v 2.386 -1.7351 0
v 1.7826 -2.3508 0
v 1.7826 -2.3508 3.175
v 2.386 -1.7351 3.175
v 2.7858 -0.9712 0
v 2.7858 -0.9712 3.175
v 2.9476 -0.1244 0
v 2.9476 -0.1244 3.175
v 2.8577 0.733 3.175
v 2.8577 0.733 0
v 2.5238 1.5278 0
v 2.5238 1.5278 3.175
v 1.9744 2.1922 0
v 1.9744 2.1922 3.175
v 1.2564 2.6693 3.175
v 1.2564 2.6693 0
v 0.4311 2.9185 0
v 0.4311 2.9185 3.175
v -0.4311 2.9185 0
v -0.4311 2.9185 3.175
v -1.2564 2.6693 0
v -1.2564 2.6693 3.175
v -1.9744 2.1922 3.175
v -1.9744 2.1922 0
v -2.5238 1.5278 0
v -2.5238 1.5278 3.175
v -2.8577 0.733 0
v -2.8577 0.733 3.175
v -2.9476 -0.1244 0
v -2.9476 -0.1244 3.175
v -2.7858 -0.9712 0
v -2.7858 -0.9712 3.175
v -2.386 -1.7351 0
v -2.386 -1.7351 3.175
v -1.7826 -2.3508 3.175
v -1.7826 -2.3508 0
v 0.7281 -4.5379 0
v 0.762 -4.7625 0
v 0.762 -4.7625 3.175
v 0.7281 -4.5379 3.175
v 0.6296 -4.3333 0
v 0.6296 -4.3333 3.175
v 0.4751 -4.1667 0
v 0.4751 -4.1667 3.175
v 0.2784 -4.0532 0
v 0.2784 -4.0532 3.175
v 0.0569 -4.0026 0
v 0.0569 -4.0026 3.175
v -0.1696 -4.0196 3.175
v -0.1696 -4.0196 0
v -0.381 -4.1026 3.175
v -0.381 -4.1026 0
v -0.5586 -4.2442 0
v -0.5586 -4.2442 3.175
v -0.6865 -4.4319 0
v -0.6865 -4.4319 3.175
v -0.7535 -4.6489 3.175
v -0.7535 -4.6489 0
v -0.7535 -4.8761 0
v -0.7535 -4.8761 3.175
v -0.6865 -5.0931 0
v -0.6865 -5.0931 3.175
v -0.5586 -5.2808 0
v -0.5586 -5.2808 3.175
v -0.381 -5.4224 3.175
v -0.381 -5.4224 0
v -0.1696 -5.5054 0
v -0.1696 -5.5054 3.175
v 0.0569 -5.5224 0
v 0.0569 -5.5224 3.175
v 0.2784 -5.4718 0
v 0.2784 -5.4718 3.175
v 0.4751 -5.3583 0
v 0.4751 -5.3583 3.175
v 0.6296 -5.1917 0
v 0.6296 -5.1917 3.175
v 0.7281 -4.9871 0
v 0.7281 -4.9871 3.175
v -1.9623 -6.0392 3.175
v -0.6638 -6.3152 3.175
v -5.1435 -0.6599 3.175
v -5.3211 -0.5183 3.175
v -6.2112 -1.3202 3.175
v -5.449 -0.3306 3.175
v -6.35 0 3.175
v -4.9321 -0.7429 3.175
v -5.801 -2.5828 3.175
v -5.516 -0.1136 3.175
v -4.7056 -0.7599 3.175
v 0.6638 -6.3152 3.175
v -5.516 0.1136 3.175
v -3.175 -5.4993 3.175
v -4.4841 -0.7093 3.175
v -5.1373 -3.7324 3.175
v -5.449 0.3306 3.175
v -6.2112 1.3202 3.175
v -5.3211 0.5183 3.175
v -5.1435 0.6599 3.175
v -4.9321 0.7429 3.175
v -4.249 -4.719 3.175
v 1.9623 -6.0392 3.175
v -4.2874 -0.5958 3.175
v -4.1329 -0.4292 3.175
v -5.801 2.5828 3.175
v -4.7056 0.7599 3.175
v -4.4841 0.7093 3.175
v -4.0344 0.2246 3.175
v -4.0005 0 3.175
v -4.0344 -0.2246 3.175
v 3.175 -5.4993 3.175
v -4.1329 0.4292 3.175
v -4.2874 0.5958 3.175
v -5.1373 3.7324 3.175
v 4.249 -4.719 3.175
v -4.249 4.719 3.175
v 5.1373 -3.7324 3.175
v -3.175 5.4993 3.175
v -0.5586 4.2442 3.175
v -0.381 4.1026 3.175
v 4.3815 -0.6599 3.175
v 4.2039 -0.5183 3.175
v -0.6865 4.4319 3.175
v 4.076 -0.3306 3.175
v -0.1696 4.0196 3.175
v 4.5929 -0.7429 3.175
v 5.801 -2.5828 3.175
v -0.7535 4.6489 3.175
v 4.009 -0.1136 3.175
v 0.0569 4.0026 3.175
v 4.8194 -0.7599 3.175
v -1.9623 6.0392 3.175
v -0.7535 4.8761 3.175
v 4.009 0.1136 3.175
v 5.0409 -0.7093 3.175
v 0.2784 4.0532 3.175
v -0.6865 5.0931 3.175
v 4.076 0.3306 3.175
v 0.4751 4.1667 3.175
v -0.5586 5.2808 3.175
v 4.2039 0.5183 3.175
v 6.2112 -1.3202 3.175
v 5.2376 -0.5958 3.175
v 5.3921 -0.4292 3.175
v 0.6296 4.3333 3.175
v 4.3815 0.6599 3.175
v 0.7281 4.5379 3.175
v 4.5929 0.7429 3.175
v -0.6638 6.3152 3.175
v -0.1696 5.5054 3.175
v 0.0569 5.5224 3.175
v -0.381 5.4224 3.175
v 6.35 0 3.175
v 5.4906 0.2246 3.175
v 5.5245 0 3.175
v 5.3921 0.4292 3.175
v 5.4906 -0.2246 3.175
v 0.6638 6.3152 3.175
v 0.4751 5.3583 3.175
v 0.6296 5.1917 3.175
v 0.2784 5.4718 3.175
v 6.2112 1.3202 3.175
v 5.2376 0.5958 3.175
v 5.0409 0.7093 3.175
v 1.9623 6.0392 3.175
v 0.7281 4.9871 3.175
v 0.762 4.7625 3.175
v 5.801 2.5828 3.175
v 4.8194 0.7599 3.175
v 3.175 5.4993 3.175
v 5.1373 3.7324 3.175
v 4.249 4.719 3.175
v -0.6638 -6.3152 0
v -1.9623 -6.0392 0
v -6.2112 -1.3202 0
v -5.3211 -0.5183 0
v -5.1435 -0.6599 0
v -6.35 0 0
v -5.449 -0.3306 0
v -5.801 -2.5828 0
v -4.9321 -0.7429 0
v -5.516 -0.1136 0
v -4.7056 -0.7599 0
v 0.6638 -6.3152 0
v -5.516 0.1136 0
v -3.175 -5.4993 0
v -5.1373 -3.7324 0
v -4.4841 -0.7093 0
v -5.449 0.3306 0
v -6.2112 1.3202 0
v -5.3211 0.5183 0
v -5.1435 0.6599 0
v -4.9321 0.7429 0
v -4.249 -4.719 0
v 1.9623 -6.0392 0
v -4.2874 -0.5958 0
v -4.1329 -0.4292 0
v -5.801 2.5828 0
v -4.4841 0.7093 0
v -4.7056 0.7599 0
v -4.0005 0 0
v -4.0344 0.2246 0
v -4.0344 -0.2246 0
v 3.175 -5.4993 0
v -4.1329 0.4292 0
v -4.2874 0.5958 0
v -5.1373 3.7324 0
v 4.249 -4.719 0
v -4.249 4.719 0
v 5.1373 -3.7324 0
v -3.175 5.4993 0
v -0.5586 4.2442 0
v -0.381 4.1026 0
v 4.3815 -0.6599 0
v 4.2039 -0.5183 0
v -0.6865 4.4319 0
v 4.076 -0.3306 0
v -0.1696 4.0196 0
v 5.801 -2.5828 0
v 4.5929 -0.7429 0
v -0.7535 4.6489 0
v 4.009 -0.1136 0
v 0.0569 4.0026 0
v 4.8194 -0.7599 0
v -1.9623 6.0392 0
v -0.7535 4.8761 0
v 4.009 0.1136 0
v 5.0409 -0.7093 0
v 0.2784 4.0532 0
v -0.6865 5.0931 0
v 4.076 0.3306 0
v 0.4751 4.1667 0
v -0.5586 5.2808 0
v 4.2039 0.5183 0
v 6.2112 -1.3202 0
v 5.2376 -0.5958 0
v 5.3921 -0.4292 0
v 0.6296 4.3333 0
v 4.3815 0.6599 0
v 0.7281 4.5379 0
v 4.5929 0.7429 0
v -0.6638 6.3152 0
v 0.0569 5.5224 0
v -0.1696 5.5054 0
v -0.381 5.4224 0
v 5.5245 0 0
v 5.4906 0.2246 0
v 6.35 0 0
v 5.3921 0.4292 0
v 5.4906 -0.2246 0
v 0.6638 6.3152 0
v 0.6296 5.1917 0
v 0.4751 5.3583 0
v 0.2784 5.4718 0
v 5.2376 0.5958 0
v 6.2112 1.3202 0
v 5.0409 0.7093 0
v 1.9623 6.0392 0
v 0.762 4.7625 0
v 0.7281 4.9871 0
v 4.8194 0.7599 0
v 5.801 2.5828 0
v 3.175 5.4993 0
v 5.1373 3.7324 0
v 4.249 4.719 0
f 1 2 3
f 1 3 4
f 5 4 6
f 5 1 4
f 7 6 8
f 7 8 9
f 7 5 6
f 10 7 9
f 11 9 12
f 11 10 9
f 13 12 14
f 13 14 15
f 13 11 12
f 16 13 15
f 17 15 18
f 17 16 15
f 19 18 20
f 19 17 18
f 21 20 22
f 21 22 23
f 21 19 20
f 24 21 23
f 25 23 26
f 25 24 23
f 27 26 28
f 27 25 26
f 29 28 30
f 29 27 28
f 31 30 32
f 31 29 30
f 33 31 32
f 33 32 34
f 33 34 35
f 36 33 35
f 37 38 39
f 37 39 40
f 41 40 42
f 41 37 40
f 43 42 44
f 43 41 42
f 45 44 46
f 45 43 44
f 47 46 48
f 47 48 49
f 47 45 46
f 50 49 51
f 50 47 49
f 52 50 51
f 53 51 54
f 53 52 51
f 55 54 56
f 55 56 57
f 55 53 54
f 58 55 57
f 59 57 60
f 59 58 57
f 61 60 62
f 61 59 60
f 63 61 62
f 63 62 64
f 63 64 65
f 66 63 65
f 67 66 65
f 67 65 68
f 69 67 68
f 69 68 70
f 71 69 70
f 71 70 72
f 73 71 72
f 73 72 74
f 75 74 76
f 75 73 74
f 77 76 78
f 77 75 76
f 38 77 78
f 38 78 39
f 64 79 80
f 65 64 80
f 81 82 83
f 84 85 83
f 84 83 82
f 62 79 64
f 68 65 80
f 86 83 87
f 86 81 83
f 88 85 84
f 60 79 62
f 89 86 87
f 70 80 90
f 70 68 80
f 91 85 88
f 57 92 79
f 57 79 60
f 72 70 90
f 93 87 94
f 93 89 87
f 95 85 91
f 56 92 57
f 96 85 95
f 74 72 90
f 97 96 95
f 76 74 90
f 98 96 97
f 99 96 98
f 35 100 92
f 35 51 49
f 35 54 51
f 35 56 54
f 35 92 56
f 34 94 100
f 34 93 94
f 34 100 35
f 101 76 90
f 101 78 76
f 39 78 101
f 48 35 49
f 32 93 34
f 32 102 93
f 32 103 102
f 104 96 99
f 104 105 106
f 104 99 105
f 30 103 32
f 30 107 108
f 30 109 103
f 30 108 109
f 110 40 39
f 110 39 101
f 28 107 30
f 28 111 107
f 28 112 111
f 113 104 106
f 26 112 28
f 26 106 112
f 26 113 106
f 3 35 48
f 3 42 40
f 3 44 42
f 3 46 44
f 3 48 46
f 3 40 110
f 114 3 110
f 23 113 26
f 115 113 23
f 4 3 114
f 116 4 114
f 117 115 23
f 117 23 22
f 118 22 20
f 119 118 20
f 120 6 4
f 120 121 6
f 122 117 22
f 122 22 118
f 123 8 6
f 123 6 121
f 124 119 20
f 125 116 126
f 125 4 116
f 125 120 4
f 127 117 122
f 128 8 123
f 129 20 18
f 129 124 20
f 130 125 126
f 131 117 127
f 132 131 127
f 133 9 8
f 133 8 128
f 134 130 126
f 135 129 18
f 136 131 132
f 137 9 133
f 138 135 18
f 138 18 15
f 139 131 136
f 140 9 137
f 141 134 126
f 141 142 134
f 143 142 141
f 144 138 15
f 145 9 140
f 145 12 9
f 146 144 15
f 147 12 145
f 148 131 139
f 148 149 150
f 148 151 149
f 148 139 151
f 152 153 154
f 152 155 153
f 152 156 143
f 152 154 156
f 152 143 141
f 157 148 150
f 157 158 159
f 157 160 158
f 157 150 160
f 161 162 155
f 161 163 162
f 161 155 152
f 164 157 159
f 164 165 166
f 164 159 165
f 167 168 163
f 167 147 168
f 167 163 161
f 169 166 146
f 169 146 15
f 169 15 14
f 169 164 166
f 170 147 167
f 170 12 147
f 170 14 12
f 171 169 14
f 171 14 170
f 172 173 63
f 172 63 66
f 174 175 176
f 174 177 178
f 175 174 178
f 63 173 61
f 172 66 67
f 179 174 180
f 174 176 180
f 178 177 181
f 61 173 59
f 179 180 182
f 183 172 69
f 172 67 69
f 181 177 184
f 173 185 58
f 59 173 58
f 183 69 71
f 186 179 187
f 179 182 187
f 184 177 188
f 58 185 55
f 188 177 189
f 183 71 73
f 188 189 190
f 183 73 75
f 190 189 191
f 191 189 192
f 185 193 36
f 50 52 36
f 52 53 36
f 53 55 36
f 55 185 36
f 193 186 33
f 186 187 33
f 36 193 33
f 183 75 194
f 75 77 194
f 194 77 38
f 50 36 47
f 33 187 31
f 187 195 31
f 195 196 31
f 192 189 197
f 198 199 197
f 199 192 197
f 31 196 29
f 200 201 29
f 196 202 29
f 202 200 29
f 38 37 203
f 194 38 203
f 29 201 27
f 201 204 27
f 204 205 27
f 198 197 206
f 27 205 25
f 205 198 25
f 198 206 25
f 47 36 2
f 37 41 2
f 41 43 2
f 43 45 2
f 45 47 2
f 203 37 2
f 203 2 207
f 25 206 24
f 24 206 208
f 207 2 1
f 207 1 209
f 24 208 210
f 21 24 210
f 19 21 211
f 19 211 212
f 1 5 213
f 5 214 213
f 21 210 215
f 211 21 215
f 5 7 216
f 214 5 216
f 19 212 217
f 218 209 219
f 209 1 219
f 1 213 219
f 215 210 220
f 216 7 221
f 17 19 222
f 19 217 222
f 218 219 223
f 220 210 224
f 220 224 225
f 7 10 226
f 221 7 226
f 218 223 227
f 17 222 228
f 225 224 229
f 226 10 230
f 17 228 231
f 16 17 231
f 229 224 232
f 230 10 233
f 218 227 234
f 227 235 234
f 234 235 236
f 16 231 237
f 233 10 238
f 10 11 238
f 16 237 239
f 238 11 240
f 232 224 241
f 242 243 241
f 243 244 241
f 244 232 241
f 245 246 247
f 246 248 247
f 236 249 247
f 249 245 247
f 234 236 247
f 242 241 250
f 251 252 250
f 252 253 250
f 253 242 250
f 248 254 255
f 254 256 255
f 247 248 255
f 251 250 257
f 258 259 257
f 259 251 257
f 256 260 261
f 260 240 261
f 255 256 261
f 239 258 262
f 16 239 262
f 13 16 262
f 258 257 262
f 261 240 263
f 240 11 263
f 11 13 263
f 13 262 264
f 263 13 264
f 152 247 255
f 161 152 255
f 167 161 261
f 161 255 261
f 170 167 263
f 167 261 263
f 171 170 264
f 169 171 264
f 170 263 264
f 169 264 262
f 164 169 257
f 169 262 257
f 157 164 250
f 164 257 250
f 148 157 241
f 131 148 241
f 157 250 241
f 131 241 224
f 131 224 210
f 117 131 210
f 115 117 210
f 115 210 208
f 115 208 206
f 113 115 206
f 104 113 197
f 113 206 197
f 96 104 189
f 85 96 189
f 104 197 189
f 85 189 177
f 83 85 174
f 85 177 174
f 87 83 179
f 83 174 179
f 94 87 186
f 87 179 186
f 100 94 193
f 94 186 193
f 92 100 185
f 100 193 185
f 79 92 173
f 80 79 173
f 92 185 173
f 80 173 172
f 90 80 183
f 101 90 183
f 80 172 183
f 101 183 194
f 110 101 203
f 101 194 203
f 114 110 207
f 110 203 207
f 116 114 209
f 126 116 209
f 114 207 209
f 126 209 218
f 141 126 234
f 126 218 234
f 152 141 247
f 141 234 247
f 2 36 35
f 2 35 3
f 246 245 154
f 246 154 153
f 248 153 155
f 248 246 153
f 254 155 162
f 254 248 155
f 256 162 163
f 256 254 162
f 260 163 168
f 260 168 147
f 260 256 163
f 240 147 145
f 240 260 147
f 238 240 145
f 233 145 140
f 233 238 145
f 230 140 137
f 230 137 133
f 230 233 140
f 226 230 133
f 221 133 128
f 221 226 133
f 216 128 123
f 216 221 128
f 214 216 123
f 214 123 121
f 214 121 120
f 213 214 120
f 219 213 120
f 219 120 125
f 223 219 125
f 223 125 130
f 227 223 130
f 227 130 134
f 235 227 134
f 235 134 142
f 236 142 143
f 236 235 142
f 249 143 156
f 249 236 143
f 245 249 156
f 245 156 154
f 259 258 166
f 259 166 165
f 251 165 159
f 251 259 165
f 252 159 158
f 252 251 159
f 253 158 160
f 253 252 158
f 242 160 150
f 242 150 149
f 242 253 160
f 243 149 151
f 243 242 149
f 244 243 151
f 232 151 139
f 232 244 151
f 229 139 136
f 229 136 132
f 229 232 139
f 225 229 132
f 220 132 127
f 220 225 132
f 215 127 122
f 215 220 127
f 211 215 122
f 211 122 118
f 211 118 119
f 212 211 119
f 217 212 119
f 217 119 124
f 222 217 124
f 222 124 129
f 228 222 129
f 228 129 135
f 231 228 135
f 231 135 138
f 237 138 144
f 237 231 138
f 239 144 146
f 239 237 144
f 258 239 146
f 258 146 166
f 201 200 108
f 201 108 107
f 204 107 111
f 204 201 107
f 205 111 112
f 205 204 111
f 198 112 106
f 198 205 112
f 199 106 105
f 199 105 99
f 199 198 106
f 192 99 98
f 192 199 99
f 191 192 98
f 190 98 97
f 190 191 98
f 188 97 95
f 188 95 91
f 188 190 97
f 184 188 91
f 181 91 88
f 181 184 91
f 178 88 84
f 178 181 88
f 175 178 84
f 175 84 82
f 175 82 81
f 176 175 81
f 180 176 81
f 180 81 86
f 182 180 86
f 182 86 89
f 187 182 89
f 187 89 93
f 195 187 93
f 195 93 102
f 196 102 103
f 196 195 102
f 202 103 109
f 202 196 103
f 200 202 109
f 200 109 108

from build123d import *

# Parameters (mm, degrees)
SKETCH1_R           = 6.35
SKETCH1_R_2         = 0.762
BOSS_EXTRUDE1_DEPTH = 3.175


with BuildPart() as part:
    # Sketch1 → Boss-Extrude1 (new body)
    with BuildSketch(Plane.XY):
        Circle(SKETCH1_R)
        with Locations((0, 4.7625)):
            Circle(SKETCH1_R_2, mode=Mode.SUBTRACT)
        with Locations((4.7625, 0)):
            Circle(SKETCH1_R_2, mode=Mode.SUBTRACT)
        with Locations((0, -4.7625)):
            Circle(SKETCH1_R_2, mode=Mode.SUBTRACT)
        with Locations((-4.7625, 0)):
            Circle(SKETCH1_R_2, mode=Mode.SUBTRACT)
        with BuildLine():
            Line((-1.782587852, -2.35077), (1.782587852, -2.35077))
            ThreePointArc((1.782587852, -2.35077), (0, 2.95021), (-1.782587852, -2.35077))
        make_face(mode=Mode.SUBTRACT)
    extrude(amount=BOSS_EXTRUDE1_DEPTH)


solid = part.part
